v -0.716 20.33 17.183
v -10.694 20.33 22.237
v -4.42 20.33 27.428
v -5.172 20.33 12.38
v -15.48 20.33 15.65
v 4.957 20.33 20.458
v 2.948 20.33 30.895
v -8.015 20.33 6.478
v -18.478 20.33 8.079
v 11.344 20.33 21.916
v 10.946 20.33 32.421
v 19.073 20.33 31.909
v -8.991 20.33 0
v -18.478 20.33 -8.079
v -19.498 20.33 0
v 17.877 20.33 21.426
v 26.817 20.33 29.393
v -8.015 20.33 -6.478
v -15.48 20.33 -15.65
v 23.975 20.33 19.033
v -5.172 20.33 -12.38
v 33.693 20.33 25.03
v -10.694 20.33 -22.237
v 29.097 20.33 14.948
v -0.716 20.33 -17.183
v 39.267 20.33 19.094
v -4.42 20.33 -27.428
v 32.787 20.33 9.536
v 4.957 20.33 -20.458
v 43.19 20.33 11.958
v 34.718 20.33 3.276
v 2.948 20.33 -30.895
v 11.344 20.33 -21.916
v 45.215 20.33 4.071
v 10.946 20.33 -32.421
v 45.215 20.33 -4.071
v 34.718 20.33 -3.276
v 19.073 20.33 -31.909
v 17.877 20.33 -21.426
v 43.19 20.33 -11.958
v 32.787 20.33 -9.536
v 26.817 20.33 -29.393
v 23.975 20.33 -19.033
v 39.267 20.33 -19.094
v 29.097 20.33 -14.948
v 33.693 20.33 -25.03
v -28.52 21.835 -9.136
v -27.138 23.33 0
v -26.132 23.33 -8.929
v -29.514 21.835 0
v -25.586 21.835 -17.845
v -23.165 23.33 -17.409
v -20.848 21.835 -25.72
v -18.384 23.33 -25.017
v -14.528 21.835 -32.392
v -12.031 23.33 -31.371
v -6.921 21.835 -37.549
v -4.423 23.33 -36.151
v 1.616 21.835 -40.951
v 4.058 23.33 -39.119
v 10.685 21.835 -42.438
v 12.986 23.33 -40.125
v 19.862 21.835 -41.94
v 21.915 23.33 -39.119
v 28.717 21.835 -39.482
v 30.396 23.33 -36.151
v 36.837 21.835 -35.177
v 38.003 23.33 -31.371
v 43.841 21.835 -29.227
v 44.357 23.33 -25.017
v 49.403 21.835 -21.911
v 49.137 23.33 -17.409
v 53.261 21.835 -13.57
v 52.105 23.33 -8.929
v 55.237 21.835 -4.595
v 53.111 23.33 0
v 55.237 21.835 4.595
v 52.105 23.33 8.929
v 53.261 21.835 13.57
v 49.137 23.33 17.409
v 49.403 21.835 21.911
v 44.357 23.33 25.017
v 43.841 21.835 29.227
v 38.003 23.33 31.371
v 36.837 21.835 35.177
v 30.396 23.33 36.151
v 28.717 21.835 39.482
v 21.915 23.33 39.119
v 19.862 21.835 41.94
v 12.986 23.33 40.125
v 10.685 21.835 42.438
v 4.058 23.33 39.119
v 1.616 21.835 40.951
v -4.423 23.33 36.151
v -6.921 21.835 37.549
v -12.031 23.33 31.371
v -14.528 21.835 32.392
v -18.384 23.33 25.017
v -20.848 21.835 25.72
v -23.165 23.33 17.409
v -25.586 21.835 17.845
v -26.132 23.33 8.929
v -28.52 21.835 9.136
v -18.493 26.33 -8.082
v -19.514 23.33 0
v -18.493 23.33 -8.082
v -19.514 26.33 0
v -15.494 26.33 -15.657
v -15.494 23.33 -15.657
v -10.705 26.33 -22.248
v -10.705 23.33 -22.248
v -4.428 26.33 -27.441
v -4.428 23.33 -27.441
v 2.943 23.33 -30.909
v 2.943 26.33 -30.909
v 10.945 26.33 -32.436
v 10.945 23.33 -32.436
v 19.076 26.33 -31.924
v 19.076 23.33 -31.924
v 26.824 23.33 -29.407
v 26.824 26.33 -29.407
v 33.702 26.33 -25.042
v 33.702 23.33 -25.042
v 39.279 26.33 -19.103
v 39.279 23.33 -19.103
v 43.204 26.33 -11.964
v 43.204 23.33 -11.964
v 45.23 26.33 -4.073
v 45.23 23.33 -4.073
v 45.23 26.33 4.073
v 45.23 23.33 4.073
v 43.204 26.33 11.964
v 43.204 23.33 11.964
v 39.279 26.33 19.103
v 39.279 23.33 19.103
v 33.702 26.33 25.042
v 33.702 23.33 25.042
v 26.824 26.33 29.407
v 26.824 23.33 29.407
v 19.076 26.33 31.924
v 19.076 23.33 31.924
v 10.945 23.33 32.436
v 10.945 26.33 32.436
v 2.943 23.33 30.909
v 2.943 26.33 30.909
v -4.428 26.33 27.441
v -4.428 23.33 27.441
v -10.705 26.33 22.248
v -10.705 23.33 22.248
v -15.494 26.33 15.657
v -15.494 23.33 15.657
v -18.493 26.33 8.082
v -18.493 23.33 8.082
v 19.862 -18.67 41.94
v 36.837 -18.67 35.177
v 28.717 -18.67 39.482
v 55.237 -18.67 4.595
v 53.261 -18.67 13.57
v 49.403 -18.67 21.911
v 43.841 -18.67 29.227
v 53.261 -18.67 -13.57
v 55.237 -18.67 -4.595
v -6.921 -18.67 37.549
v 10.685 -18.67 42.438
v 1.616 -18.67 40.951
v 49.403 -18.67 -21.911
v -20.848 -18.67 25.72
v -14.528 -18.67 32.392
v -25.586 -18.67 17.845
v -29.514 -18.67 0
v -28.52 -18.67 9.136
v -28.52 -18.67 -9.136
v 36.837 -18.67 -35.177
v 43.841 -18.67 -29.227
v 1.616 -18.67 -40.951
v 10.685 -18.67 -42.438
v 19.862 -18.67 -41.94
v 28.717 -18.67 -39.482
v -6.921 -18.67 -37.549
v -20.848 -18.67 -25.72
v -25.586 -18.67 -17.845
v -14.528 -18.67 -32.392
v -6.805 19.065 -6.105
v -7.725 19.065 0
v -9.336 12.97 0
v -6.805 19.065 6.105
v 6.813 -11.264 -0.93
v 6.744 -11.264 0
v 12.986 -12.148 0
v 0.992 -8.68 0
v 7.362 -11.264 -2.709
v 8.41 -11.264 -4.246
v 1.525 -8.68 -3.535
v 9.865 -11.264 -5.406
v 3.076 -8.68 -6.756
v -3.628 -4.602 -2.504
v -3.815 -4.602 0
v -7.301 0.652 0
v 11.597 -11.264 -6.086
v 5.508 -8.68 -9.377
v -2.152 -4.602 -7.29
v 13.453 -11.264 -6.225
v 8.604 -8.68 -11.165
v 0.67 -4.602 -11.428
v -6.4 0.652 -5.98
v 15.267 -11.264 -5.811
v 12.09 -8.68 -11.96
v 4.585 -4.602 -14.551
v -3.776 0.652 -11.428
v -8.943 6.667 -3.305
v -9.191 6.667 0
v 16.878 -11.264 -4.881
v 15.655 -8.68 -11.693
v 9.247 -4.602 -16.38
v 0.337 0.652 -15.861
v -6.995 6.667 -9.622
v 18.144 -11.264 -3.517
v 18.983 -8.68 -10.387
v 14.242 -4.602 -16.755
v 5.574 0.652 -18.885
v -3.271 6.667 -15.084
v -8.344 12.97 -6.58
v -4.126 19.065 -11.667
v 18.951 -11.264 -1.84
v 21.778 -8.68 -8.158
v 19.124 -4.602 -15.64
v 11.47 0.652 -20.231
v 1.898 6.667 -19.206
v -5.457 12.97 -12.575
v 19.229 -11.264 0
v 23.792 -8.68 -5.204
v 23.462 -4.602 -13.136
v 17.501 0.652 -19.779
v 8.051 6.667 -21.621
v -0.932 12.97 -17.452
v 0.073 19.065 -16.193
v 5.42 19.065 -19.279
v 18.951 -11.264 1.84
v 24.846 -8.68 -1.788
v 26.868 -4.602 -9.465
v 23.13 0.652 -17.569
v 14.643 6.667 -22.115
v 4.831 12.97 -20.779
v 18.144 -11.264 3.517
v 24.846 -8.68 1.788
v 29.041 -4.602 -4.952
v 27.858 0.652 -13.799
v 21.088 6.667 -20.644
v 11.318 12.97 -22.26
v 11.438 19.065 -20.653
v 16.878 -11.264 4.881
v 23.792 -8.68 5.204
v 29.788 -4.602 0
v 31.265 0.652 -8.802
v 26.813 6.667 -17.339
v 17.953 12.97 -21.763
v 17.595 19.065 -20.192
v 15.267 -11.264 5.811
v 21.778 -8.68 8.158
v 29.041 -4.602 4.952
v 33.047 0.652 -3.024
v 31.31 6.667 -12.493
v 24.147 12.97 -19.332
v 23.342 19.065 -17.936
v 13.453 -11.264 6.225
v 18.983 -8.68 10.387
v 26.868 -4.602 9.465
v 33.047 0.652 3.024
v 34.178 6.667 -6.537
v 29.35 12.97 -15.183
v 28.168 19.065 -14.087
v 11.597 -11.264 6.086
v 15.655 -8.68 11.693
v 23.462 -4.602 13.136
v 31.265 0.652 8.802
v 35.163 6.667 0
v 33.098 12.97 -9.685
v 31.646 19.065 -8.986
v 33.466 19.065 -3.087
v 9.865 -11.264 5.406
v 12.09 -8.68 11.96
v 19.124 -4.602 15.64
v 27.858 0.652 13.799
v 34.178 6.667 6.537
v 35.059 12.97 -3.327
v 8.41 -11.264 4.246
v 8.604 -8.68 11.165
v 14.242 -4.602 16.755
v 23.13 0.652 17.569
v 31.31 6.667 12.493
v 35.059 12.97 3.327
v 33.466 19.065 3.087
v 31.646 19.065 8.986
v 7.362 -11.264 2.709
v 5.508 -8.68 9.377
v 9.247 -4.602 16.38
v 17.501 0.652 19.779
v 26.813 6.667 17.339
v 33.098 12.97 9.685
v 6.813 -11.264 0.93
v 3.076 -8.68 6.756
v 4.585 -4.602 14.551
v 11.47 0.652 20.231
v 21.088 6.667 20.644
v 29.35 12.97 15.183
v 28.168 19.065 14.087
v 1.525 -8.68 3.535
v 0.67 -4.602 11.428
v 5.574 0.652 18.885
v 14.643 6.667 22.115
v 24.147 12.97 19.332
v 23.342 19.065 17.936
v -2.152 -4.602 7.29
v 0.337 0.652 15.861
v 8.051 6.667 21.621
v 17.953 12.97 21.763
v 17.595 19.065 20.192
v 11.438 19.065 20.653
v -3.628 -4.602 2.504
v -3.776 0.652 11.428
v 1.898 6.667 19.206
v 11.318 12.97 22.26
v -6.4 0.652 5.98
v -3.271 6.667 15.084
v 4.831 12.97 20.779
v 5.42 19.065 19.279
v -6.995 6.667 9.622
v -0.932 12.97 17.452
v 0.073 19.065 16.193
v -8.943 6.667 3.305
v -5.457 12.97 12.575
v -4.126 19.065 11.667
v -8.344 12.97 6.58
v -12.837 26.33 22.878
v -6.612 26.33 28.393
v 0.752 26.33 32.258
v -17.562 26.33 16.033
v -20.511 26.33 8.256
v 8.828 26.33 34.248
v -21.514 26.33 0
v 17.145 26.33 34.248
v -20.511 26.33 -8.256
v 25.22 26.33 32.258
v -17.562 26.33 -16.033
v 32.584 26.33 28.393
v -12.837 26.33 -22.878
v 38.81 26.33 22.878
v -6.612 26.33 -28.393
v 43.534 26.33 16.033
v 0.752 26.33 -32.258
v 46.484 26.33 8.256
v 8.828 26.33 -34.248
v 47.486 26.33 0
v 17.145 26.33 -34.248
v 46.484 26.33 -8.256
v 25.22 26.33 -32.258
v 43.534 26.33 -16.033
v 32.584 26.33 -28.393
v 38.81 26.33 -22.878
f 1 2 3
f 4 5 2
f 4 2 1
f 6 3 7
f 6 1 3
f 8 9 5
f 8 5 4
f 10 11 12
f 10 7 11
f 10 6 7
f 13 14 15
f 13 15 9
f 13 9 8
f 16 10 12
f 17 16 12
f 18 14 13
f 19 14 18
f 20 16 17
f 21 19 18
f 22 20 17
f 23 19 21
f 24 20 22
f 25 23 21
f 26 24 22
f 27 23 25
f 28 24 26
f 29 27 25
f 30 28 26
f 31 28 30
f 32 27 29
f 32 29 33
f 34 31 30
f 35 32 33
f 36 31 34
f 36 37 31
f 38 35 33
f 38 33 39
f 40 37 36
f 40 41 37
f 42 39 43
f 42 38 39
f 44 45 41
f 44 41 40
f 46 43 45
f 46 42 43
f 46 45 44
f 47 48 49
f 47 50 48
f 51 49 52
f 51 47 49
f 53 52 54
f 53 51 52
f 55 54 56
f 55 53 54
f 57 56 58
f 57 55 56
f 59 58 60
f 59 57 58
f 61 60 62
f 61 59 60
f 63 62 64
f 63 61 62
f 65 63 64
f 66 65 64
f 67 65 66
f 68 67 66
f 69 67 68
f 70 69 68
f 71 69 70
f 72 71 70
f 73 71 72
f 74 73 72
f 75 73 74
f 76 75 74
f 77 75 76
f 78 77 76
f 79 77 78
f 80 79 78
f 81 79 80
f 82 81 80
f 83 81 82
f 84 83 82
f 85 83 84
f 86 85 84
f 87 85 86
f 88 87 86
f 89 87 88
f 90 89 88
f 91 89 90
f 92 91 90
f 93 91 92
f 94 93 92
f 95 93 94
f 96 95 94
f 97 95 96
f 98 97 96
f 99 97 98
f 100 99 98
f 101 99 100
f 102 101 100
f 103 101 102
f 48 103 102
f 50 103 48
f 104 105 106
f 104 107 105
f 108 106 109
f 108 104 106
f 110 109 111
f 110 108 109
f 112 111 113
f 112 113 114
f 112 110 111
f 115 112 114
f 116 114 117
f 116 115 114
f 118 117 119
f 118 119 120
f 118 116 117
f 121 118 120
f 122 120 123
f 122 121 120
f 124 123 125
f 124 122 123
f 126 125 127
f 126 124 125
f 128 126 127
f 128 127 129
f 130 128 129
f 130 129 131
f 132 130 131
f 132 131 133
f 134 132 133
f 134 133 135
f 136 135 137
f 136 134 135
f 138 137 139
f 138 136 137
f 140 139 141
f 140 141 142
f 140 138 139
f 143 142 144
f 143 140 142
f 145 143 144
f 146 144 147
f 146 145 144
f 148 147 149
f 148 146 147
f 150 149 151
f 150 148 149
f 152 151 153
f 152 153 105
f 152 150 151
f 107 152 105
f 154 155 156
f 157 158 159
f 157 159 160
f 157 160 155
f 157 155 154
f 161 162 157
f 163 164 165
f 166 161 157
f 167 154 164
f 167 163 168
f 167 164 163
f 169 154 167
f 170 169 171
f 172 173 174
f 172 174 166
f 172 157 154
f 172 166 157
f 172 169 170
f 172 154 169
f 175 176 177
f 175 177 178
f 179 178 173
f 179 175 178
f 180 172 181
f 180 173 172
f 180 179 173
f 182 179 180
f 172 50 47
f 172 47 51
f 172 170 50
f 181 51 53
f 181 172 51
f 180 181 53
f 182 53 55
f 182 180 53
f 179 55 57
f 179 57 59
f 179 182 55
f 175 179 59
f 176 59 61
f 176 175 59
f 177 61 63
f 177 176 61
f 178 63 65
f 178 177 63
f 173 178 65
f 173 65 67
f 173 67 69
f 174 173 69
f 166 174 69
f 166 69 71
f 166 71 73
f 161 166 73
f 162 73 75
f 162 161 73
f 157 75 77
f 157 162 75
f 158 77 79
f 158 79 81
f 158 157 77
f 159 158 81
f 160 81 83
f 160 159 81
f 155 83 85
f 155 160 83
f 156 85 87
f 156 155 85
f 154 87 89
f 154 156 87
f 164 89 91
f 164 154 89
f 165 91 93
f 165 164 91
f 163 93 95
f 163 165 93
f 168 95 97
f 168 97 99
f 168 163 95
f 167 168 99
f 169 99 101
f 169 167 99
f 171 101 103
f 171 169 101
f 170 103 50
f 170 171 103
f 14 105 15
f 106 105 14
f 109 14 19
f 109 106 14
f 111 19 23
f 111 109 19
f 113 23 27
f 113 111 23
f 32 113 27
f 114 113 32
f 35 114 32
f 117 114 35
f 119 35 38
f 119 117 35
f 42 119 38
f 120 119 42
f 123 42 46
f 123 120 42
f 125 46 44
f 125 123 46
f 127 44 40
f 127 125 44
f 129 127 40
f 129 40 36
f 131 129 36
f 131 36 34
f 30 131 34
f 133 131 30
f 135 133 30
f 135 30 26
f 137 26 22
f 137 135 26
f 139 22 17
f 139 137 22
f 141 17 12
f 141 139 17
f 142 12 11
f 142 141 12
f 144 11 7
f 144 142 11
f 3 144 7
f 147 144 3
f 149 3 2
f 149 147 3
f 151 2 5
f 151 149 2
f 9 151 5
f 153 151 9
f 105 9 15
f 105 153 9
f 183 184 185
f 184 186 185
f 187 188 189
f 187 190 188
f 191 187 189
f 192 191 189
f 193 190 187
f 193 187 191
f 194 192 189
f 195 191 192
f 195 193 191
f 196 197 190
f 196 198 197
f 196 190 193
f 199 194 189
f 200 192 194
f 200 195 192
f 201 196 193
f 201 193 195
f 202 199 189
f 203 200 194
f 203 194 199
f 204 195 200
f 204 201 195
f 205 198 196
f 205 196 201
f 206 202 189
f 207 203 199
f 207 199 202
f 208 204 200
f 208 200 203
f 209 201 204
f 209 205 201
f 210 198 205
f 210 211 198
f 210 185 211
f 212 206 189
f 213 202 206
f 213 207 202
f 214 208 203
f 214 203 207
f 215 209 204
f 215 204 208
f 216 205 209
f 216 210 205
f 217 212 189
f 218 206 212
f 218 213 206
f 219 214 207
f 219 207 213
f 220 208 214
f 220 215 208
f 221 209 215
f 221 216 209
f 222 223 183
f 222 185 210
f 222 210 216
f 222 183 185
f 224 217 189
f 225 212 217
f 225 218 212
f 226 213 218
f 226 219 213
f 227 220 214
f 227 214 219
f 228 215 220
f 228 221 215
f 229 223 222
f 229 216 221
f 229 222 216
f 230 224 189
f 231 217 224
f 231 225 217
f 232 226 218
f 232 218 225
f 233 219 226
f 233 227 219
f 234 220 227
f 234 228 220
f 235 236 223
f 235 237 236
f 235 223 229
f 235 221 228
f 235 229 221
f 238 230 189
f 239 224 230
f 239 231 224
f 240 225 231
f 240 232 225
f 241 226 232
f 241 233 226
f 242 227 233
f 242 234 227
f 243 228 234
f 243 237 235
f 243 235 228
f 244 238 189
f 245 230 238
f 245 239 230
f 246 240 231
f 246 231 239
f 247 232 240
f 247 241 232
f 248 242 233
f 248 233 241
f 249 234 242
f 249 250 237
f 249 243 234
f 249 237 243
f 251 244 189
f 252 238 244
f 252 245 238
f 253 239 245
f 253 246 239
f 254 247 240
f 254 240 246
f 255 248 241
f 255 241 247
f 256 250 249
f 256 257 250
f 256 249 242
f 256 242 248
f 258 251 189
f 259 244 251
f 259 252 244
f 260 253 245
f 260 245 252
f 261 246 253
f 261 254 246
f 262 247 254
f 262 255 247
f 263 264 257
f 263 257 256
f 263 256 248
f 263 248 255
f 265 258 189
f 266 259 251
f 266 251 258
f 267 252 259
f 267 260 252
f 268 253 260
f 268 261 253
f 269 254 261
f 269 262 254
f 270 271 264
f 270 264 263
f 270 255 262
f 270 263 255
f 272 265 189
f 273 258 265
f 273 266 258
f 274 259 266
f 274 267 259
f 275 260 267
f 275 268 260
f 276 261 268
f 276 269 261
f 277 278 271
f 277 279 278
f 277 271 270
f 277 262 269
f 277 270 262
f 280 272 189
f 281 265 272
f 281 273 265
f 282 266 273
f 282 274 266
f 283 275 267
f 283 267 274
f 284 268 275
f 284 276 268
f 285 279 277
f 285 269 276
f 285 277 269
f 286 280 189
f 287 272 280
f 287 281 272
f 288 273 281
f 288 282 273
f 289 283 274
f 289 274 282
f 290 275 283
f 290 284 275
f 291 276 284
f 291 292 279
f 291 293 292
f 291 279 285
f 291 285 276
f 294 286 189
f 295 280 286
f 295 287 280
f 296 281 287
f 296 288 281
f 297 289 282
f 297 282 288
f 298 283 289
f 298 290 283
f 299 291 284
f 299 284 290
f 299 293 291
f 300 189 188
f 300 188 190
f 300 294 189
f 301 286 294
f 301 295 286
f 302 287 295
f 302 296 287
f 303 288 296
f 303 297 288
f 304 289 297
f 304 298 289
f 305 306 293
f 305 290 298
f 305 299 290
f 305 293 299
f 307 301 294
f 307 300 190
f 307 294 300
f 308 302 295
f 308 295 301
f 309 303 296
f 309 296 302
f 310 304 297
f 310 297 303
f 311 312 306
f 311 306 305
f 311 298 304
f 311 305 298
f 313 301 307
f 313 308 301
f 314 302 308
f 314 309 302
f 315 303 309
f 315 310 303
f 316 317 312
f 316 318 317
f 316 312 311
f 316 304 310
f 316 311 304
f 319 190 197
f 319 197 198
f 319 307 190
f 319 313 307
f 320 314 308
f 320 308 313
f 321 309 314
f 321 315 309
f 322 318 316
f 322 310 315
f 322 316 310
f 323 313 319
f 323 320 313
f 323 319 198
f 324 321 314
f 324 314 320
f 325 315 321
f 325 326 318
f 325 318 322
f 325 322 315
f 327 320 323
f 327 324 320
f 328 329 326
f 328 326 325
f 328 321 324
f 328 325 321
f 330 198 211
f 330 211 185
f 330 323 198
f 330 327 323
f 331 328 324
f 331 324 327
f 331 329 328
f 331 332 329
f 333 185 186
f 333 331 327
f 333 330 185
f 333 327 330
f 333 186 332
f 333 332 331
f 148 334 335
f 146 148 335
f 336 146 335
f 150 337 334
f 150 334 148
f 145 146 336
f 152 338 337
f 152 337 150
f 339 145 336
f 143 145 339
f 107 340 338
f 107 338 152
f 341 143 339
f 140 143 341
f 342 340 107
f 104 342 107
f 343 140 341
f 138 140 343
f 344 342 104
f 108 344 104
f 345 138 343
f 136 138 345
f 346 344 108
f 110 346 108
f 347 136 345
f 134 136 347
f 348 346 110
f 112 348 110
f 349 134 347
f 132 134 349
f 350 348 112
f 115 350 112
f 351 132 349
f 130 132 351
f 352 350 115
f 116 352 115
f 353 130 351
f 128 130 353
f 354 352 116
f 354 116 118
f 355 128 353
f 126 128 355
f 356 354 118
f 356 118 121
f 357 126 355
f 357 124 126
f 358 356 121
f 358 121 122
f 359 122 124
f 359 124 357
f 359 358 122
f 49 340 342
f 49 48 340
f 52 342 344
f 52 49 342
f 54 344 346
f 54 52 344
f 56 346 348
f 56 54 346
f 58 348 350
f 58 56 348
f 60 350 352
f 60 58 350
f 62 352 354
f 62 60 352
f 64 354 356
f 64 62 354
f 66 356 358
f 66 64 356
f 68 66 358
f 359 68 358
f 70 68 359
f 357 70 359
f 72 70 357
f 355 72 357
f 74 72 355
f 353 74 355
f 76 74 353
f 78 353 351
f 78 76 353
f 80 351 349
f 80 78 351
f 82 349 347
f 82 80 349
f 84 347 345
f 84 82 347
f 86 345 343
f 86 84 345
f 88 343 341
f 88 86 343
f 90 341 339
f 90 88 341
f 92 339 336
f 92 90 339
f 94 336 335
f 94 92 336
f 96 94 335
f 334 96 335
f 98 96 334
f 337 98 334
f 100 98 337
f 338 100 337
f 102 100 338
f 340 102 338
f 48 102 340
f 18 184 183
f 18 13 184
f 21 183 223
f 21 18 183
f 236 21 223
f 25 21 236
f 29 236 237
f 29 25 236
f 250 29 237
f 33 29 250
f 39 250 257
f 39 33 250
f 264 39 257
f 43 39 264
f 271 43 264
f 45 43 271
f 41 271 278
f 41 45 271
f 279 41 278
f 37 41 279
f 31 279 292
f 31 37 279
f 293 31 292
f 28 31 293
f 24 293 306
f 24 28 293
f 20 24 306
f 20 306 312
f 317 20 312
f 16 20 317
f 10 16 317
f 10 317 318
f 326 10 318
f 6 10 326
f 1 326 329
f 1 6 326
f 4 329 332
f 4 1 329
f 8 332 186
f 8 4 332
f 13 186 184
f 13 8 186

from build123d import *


with BuildPart() as part:
    # Sketch1 → Revolve1 (revolve)
    with BuildSketch(Plane.XY):
        with BuildLine():
            Line((-19.513838733, 23.330040777), (-19.513838733, 26.330040777))
            Line((-19.513838733, 26.330040777), (-21.513838733, 26.330040777))
            Line((-21.513838733, 26.330040777), (-27.138378423, 23.330040777))
            Line((-27.138378423, 23.330040777), (-29.513838733, 21.835217327))
            Line((-29.513838733, 21.835217327), (-29.513838733, -18.669959223))
            Line((-29.513838733, -18.669959223), (12.986161267, -18.669959223))
            Line((12.986161267, -18.669959223), (12.986161267, -12.147726016))
            ThreePointArc((12.986161267, -12.147726016), (-5.743453451, -2.097812317), (-7.724873095, 19.065202805))
            Line((-7.724873095, 19.065202805), (-8.991099708, 20.330040777))
            Line((-8.991099708, 20.330040777), (-19.498450474, 20.330040777))
            Line((-19.498450474, 20.330040777), (-19.513838733, 23.330040777))
        make_face()
    revolve(axis=Axis((12.986161267, -12.147726016, 0), (0, -1, 0)))


solid = part.part
